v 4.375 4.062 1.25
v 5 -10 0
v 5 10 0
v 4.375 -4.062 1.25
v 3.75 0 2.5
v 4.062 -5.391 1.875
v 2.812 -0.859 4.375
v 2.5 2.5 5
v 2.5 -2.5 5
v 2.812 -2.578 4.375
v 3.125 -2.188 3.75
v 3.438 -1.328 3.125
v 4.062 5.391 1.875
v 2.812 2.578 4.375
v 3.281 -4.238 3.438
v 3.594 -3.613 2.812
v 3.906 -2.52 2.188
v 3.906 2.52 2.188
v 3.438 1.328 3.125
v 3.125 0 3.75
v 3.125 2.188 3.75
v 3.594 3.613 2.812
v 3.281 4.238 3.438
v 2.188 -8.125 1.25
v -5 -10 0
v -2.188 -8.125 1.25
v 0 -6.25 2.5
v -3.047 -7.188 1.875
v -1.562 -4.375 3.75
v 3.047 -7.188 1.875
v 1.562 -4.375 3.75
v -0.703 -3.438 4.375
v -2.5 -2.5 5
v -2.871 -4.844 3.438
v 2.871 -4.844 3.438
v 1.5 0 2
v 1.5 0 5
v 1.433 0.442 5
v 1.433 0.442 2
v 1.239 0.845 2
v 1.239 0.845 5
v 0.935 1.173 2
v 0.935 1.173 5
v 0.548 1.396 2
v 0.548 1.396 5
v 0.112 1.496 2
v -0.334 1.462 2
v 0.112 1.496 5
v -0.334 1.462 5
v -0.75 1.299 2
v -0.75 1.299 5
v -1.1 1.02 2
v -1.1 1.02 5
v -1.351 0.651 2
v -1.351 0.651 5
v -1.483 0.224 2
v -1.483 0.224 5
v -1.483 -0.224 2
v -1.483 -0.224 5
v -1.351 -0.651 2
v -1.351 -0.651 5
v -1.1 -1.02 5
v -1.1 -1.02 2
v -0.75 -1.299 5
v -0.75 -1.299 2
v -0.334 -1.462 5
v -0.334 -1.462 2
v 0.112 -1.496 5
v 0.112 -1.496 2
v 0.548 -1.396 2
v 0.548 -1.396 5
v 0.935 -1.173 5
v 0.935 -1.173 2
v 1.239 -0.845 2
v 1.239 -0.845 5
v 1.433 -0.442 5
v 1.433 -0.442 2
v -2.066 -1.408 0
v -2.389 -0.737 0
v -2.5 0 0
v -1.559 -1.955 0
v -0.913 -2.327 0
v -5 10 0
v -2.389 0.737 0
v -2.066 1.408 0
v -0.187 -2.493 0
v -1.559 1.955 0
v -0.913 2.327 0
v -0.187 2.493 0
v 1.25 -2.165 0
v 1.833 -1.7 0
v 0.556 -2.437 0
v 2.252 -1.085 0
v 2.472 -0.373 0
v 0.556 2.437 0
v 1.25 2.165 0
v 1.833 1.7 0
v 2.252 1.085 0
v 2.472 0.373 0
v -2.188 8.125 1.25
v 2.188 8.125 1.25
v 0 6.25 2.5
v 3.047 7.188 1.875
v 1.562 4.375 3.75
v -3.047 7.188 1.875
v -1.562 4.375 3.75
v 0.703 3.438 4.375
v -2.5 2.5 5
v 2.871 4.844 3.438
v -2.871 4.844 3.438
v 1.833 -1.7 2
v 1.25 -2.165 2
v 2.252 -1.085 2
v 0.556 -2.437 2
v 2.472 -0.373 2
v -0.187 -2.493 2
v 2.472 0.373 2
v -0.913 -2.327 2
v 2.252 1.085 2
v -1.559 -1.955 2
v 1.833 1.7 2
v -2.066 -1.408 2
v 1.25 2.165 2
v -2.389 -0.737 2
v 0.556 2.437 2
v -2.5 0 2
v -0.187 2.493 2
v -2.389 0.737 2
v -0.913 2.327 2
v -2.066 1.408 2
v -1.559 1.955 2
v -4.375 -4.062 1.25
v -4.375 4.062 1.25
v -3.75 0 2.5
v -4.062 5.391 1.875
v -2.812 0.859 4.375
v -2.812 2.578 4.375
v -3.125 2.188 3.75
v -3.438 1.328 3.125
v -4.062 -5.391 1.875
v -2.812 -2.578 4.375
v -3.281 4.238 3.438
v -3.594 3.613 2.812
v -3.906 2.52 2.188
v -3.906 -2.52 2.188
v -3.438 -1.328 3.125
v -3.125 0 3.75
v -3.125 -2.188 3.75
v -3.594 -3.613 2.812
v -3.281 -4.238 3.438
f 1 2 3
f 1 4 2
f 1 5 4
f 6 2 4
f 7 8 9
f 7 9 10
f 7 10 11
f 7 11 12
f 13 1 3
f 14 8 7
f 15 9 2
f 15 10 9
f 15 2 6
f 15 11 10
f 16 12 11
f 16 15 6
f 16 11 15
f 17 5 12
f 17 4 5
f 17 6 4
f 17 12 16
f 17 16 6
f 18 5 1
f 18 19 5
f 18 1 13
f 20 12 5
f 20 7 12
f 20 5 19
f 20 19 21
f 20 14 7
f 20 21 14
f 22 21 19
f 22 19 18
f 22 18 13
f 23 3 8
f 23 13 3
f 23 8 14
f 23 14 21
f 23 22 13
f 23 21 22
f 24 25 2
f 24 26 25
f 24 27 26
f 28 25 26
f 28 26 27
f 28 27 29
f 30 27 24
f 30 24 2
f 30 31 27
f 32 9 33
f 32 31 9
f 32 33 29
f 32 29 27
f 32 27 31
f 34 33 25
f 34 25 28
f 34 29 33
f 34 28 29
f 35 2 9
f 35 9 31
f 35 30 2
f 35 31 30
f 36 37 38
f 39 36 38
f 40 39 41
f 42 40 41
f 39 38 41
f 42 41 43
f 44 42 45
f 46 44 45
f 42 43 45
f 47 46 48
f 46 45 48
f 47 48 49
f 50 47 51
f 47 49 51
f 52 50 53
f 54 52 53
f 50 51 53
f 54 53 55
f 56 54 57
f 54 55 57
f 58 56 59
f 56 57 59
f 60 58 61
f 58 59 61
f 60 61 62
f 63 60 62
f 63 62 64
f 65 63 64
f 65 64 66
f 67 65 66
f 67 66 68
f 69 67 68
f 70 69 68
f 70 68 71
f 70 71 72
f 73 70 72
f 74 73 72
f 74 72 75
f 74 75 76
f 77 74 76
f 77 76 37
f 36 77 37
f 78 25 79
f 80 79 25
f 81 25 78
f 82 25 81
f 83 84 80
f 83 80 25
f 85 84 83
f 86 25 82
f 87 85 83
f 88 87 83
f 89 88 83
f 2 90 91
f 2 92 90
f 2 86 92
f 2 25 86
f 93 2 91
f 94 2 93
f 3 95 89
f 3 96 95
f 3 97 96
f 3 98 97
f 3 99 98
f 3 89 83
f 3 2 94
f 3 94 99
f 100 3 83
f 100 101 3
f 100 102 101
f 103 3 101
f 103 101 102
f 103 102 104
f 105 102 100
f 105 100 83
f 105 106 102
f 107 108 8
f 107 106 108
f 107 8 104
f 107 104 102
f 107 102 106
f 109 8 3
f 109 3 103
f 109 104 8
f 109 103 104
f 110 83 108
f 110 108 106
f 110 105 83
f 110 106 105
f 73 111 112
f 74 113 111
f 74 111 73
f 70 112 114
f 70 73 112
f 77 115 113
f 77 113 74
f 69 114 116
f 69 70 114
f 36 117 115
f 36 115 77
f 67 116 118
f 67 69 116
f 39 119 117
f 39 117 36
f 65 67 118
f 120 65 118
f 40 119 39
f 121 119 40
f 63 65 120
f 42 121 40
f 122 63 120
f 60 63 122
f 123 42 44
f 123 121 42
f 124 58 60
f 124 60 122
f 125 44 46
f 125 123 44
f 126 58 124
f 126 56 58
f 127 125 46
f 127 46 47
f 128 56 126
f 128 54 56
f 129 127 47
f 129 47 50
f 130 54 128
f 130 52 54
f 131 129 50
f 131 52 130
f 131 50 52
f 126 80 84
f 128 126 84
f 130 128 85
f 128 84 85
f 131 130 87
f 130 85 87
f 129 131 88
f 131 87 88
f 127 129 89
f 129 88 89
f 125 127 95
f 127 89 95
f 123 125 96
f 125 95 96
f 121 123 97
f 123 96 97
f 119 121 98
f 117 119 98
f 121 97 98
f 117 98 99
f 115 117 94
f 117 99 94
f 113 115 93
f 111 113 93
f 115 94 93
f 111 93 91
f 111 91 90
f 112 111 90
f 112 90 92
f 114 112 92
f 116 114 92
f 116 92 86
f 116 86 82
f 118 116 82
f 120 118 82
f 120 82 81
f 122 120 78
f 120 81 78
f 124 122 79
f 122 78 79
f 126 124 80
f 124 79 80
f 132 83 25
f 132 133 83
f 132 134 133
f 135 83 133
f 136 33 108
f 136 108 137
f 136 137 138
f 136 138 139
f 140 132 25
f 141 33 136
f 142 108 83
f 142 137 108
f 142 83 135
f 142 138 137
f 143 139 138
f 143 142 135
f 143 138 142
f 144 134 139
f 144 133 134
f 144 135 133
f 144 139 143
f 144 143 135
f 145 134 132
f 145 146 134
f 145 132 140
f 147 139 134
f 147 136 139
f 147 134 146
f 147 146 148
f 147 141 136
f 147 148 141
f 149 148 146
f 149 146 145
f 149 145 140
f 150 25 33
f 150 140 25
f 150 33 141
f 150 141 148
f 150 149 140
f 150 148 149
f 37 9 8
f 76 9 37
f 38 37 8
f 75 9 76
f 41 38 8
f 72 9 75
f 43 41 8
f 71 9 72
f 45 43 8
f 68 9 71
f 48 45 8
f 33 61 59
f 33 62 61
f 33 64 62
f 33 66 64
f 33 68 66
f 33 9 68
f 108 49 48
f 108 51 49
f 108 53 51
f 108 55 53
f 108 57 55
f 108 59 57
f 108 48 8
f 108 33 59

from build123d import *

# Parameters (mm, degrees)
CROQUIS10_R           = 1.5
CORTAR_EXTRUIR1_DEPTH = 5
CROQUIS11_R           = 2.5
CORTAR_EXTRUIR2_DEPTH = 2


with BuildPart() as part:
    # Croquis1 → Recubrir1 section 0
    with BuildSketch(Plane.XY):
        with BuildLine():
            Line((-5, -10), (5, -10))
            Line((5, -10), (5, 10))
            Line((5, 10), (-5, 10))
            Line((-5, 10), (-5, -10))
        make_face()
    # Croquis9 → Recubrir1 section 1
    with BuildSketch(Plane.XY.offset(5)):
        with BuildLine():
            Line((-2.5, 2.5), (2.5, 2.5))
            Line((2.5, 2.5), (2.5, -2.5))
            Line((2.5, -2.5), (-2.5, -2.5))
            Line((-2.5, -2.5), (-2.5, 2.5))
        make_face()
    loft()

    # Croquis10 → Cortar-Extruir1 (cut)
    with BuildSketch(Plane.XY.offset(5)):
        Circle(CROQUIS10_R)
    extrude(amount=-CORTAR_EXTRUIR1_DEPTH, mode=Mode.SUBTRACT)

    # Croquis11 → Cortar-Extruir2 (cut)
    with BuildSketch(Plane(origin=(0, 0, 0), x_dir=(-1, 0, 0), z_dir=(0, 0, -1))):
        Circle(CROQUIS11_R)
    extrude(amount=-CORTAR_EXTRUIR2_DEPTH, mode=Mode.SUBTRACT)


solid = part.part
